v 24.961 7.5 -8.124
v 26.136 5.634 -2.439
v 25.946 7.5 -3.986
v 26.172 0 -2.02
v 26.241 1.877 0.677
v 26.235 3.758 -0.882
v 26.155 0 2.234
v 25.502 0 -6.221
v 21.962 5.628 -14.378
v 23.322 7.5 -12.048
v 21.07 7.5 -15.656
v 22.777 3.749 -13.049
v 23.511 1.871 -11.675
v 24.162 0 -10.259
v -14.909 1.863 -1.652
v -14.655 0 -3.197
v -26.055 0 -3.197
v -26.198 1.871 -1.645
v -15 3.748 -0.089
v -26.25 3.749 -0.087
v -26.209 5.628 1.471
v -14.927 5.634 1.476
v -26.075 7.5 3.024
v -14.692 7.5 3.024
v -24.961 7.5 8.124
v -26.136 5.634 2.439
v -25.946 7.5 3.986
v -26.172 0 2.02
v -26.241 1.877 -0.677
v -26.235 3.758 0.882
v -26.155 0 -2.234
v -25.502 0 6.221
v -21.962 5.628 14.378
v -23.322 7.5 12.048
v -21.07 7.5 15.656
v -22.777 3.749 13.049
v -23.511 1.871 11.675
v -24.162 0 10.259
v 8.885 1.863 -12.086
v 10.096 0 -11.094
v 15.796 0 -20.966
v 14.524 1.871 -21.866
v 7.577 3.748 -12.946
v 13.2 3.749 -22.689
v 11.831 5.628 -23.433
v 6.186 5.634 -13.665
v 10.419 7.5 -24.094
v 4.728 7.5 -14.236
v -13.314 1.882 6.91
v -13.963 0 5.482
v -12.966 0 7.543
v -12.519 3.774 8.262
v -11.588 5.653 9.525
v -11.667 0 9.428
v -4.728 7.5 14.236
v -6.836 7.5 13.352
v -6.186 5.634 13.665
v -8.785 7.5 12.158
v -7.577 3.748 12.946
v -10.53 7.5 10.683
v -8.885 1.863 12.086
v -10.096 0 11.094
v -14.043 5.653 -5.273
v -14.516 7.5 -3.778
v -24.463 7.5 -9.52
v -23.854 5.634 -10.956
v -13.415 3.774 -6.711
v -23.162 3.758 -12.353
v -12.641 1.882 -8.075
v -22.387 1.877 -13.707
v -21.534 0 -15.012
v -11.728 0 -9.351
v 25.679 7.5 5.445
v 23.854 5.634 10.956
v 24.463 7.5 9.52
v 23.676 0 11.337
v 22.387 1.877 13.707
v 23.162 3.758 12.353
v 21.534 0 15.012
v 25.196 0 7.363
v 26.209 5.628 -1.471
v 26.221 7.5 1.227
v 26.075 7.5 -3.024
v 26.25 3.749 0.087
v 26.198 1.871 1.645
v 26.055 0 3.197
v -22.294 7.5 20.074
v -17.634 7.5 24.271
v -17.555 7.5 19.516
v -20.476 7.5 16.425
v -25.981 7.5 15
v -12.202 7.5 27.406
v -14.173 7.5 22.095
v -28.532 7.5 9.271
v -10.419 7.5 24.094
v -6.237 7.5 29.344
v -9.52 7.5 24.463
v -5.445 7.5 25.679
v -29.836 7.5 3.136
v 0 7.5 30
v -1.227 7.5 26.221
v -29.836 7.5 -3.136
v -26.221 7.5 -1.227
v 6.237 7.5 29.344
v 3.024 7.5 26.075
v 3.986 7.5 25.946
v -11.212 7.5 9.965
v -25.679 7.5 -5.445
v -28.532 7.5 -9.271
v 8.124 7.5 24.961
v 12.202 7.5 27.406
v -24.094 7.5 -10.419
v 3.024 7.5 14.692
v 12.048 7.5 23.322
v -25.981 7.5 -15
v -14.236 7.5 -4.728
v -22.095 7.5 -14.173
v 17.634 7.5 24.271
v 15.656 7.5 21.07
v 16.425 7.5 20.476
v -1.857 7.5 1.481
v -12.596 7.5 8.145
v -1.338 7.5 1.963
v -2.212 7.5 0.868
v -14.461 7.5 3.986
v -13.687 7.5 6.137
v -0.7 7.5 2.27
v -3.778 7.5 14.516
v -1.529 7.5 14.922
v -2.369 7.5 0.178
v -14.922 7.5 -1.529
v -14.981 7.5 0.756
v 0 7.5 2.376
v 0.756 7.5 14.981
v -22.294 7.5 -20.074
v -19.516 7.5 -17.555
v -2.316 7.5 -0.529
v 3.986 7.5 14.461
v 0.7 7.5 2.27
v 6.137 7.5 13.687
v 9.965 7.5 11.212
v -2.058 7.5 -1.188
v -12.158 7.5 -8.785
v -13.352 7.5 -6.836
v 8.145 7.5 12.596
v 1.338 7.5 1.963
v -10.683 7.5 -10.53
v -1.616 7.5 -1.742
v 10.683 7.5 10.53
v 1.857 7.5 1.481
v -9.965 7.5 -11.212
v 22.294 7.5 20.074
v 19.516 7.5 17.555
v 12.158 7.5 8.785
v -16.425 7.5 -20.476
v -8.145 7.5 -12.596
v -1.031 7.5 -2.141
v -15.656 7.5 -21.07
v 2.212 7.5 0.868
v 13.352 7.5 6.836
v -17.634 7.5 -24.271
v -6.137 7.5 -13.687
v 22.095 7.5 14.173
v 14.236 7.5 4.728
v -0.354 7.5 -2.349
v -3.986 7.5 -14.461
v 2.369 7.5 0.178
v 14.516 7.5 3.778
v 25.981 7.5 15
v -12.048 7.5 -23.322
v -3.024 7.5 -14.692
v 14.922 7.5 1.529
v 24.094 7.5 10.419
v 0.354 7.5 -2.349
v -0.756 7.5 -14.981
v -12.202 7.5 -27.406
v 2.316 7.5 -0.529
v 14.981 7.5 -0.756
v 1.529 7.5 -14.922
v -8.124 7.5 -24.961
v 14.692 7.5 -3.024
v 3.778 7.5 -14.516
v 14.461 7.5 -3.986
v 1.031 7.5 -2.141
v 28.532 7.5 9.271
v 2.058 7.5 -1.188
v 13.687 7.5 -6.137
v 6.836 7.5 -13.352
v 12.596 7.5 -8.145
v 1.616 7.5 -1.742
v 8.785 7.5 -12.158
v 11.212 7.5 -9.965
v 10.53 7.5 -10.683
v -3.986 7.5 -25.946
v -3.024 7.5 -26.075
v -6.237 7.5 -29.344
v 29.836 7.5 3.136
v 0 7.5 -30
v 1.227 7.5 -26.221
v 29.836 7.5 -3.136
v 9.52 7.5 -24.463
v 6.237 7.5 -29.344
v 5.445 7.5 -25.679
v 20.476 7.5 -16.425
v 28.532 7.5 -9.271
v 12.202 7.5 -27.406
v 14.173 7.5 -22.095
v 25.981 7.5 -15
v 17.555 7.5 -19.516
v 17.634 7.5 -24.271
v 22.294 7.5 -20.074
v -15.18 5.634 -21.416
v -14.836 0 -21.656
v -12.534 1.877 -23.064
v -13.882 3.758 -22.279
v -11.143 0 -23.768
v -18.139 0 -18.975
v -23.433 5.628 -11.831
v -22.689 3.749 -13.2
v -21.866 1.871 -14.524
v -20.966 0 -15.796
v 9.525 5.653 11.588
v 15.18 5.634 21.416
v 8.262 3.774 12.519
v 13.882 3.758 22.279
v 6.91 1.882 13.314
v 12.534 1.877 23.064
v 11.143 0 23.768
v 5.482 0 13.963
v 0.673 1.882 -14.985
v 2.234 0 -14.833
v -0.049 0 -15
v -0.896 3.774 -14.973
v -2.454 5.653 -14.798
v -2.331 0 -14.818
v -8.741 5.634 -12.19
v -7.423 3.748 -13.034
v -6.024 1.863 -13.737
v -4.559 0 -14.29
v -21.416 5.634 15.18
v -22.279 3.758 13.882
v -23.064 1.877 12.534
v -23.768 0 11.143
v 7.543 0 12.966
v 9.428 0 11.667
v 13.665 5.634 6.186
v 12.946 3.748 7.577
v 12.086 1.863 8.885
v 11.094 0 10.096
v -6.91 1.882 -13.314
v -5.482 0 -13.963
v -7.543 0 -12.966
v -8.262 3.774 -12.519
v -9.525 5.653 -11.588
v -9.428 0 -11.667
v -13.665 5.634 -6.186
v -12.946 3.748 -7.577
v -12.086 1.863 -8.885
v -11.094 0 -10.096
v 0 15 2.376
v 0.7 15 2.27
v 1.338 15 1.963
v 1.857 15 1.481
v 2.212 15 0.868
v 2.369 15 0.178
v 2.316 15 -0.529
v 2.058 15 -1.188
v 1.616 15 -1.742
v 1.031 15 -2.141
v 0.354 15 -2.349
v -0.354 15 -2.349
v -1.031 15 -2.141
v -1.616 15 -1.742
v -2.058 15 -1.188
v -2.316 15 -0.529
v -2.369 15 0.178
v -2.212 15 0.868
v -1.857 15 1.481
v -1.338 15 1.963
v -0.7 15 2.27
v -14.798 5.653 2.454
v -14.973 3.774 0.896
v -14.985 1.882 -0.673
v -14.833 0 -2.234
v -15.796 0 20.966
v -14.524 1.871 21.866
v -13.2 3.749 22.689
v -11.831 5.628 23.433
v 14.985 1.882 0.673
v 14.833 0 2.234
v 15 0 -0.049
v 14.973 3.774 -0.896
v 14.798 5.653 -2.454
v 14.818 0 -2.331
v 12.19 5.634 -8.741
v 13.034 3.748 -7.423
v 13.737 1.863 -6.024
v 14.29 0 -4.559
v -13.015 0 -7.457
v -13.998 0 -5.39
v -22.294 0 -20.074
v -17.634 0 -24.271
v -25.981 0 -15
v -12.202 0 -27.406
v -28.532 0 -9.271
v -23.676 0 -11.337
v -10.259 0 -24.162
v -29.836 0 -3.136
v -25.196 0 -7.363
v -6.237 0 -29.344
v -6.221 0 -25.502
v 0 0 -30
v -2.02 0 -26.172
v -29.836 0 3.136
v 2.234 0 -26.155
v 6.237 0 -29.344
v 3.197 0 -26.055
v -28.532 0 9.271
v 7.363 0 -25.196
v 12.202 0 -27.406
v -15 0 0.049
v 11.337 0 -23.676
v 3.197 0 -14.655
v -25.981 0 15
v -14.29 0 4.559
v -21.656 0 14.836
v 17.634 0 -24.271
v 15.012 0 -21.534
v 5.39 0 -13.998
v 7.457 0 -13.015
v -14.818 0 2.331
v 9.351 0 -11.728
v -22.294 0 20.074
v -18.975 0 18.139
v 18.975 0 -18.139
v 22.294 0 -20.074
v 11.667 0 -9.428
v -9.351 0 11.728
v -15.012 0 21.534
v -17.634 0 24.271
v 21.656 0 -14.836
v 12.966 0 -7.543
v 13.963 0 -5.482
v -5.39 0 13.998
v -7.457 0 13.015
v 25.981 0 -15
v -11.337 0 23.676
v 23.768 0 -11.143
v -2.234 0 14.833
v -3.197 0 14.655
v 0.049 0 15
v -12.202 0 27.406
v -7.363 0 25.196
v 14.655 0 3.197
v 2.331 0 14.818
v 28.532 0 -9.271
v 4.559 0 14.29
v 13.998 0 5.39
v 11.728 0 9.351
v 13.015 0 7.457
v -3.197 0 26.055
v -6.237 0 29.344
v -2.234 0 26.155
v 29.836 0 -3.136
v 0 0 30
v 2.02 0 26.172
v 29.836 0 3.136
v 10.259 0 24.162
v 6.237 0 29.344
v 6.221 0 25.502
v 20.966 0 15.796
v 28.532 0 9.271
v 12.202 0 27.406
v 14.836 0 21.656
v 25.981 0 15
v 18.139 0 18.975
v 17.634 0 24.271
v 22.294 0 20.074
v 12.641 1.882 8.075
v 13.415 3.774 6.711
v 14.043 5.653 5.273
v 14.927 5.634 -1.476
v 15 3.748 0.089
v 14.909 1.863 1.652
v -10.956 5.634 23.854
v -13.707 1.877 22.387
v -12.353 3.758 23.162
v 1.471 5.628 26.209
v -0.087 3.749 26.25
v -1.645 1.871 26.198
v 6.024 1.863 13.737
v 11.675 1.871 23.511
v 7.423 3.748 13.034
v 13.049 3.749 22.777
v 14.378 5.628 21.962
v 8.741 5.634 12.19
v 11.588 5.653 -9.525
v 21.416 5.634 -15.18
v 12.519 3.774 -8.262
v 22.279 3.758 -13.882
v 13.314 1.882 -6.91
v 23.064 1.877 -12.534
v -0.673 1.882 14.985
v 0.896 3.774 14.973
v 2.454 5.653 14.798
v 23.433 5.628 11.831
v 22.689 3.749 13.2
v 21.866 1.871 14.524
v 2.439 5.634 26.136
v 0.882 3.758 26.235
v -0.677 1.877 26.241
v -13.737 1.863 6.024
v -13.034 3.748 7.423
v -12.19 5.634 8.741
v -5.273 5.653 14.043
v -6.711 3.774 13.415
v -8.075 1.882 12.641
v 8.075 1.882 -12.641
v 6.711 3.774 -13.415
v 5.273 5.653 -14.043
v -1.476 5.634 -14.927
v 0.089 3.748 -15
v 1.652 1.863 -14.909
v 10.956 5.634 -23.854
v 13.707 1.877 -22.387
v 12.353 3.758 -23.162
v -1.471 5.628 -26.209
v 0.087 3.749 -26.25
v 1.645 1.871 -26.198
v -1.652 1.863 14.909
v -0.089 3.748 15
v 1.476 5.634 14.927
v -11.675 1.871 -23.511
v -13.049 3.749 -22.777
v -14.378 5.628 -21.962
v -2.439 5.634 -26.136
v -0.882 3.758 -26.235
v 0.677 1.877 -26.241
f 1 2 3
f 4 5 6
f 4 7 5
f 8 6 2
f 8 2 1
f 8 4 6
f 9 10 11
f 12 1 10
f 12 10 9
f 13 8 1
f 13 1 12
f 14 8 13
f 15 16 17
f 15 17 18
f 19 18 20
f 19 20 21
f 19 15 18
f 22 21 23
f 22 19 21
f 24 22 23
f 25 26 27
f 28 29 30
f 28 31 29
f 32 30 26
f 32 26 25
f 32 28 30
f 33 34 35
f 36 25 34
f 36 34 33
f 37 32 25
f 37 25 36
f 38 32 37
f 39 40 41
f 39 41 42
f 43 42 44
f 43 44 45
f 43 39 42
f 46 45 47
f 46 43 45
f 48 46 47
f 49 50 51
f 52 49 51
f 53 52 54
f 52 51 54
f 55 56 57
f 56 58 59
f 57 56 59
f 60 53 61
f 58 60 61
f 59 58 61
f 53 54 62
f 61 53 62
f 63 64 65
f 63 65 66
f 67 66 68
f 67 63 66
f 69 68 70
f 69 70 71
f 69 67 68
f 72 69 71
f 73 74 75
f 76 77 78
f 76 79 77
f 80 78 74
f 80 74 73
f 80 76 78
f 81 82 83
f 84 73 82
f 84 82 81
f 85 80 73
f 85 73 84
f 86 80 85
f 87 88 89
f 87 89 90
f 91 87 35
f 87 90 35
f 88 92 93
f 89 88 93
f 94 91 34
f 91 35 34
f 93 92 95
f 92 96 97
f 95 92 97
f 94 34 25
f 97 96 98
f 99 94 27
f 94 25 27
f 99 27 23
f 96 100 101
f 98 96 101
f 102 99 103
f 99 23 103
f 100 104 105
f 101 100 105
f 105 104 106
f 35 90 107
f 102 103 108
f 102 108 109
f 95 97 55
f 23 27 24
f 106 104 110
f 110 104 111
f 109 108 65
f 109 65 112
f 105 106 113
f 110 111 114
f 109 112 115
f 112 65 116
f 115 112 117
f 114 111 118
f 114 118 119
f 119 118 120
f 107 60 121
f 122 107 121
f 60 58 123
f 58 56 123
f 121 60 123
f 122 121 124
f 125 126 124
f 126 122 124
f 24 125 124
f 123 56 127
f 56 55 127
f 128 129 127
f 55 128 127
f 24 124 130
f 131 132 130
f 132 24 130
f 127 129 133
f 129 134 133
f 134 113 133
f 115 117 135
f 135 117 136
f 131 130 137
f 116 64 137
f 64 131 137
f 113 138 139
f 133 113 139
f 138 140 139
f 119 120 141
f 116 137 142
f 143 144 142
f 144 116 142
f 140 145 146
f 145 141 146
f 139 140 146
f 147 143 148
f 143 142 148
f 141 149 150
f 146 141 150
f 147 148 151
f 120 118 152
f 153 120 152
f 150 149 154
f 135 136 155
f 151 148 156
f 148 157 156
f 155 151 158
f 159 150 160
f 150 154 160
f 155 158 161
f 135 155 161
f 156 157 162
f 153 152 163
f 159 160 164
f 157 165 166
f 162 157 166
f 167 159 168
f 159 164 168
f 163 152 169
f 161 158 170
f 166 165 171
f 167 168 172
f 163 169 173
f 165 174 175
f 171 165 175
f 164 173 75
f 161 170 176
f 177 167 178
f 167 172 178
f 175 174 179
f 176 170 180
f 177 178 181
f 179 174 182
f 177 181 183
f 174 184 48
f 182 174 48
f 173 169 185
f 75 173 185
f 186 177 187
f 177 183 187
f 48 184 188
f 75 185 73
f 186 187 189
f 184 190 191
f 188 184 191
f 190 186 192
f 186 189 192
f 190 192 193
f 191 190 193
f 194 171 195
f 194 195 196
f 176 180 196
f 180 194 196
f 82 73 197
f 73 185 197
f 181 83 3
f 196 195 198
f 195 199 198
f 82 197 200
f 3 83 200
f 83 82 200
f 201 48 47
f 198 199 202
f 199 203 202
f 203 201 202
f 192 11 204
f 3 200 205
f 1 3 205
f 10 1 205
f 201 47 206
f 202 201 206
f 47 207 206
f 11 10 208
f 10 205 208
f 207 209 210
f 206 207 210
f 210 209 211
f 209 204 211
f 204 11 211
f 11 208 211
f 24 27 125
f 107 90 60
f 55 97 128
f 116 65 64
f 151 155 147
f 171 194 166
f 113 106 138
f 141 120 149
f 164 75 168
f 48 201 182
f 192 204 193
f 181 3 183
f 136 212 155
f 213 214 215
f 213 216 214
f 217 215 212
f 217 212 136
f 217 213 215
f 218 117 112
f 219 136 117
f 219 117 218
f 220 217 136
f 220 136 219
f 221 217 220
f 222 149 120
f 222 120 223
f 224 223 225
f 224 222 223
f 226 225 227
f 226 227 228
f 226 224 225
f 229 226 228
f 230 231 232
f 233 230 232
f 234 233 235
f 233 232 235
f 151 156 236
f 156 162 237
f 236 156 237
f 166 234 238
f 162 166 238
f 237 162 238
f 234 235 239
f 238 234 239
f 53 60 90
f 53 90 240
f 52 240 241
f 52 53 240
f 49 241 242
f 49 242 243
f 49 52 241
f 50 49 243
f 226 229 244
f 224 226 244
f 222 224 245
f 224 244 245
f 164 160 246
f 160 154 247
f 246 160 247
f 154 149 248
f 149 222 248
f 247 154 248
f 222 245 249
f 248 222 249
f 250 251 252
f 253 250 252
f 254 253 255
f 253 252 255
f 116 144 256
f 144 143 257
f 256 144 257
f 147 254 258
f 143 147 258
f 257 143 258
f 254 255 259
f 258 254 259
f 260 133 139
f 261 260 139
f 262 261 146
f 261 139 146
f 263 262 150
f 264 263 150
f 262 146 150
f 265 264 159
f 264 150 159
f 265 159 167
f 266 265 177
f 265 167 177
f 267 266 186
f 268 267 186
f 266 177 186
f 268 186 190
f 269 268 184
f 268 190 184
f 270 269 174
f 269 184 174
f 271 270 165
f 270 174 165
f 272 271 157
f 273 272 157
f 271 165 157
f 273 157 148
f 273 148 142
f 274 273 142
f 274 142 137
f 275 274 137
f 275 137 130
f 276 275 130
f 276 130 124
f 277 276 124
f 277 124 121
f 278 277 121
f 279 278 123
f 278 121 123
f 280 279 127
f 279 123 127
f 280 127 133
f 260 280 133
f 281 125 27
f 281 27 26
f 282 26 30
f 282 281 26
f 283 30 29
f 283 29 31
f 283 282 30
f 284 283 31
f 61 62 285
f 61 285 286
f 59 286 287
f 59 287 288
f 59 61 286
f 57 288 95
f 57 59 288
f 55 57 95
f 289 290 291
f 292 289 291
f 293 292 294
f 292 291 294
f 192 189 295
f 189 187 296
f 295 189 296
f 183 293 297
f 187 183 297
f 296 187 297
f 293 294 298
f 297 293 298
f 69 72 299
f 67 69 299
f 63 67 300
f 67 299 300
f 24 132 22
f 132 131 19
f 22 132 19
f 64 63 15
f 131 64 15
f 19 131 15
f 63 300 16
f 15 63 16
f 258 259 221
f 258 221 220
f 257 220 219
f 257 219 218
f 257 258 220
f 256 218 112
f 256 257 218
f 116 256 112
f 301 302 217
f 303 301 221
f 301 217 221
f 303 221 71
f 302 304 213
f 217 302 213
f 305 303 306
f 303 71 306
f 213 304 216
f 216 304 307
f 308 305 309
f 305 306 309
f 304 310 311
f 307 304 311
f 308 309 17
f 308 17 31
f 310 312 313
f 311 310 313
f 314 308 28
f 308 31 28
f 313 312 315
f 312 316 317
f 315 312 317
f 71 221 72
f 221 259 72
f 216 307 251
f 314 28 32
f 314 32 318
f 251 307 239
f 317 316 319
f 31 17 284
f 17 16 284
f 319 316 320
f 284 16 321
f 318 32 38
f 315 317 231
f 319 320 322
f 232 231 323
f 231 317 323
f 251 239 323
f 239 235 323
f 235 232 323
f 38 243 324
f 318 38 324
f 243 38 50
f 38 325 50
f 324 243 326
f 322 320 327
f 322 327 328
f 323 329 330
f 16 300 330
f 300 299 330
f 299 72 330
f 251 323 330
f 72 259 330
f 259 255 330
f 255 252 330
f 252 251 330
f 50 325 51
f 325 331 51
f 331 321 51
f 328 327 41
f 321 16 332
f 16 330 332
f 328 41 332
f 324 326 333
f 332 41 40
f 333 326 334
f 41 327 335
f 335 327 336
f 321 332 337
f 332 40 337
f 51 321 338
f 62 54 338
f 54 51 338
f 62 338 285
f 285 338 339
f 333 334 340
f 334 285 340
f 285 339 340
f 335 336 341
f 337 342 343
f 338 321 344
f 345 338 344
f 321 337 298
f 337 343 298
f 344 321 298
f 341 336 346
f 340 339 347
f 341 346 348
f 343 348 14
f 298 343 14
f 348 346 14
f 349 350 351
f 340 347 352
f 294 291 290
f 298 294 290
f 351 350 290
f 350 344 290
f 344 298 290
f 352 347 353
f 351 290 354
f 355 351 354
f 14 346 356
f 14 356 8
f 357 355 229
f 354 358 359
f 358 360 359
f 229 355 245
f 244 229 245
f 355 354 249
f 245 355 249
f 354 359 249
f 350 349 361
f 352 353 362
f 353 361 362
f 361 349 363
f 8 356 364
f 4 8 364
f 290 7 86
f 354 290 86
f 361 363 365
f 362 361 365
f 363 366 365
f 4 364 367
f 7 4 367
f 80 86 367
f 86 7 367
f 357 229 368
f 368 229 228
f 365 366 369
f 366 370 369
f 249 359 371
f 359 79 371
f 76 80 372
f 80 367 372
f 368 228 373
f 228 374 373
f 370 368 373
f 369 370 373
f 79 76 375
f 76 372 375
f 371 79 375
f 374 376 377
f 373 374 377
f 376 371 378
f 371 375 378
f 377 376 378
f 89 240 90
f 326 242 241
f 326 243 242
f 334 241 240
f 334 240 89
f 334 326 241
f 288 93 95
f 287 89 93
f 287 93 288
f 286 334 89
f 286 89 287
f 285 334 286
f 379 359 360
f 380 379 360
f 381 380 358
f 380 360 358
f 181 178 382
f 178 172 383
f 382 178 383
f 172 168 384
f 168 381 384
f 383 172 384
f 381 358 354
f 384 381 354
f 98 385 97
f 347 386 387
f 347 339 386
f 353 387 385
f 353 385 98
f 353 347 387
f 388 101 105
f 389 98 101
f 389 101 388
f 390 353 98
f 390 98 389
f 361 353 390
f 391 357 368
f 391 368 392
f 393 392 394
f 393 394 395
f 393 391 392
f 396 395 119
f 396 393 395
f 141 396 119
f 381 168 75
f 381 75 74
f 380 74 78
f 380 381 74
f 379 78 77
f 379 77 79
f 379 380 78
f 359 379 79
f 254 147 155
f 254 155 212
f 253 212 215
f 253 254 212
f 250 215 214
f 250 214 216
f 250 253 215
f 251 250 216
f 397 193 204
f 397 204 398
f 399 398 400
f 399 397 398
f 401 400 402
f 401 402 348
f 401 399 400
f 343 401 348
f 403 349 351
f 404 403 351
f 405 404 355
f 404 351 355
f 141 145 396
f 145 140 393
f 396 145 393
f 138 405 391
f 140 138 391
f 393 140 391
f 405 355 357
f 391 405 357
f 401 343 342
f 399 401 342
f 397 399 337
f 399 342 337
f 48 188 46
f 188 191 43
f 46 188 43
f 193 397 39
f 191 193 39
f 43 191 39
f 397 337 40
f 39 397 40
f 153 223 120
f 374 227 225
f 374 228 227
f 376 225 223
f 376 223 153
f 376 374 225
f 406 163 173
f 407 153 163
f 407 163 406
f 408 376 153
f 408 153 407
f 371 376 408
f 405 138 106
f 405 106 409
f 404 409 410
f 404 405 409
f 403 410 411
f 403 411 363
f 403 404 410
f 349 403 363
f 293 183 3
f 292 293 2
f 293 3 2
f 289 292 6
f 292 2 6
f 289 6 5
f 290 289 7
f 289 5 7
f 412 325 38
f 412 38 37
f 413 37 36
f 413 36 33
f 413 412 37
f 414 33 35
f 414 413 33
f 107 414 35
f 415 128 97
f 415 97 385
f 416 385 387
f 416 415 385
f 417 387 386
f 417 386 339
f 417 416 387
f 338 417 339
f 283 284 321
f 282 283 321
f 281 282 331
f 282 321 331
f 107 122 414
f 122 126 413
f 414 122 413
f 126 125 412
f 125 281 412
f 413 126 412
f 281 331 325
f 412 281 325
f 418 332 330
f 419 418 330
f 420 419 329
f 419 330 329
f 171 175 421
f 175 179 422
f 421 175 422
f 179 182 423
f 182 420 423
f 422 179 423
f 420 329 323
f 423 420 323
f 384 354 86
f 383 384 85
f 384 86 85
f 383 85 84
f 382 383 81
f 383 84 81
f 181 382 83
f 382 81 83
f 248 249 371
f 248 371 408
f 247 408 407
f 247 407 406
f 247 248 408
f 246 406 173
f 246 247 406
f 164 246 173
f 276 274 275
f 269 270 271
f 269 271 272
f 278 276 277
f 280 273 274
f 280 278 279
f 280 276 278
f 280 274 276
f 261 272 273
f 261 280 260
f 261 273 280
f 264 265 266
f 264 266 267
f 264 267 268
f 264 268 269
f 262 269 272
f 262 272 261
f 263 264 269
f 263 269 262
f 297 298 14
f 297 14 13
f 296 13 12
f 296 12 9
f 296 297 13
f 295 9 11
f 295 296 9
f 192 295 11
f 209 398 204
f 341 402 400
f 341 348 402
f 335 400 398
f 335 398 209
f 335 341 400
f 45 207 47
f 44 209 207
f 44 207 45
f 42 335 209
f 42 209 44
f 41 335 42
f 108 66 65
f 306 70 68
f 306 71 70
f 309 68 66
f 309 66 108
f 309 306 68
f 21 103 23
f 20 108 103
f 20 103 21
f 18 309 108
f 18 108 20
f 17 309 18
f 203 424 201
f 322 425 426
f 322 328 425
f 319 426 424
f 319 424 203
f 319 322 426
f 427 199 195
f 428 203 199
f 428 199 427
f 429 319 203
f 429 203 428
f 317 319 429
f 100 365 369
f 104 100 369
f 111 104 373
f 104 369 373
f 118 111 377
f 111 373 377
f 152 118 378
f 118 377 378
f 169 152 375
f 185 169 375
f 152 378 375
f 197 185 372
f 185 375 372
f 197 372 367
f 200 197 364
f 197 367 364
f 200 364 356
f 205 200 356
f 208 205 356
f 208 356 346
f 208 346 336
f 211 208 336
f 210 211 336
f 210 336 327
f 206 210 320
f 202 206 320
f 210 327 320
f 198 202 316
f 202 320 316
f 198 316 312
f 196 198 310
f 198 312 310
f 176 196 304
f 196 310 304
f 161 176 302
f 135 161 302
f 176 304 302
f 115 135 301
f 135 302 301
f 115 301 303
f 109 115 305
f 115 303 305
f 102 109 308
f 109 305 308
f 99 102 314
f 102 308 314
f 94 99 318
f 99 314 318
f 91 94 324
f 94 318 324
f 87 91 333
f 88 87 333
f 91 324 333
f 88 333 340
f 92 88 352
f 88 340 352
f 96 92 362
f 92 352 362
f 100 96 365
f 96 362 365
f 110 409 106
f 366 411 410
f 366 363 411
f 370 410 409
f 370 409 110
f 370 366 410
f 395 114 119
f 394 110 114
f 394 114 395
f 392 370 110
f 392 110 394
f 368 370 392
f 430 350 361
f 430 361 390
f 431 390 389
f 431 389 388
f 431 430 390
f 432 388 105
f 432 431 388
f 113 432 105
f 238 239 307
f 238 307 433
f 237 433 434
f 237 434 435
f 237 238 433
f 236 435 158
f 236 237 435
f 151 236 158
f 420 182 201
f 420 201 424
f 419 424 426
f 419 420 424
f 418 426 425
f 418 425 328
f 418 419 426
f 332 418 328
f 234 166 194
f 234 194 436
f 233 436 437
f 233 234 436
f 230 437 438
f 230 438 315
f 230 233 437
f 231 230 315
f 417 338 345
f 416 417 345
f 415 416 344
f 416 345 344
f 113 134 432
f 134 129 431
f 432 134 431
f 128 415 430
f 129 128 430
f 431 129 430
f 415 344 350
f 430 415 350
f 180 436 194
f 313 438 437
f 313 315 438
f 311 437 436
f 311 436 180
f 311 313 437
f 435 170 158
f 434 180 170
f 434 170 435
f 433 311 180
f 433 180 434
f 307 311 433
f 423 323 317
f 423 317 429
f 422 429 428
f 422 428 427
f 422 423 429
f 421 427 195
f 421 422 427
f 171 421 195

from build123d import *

# Parameters (mm, degrees)
SKETCH1_R                            = 20
BOSS_EXTRUDE1_DEPTH                  = 10
SKETCH1_R_2                          = 40
SKETCH1_R_3                          = 35
BOSS_EXTRUDE1_2_DEPTH                = 10
BOSS_EXTRUDE2_REACH                  = 89.446
BOSS_EXTRUDE2_END_RADIUS             = 35
BOSS_EXTRUDE2_START                  = 30
BOSS_EXTRUDE2_DIRECTION_2_REACH      = 89.446
BOSS_EXTRUDE2_DIRECTION_2_END_RADIUS = 20
CIRPATTERN1_COUNT                    = 12
SKETCH5_R                            = 3.167731354
BOSS_EXTRUDE3_DEPTH                  = 10
SCALE1_SCALE                         = 0.75


with BuildPart() as part:
    # Sketch1 → Boss-Extrude1 (new body)
    with BuildSketch(Plane(origin=(0, 0, 0), x_dir=(1, 0, 0), z_dir=(0, 1, 0))):
        with Locations(Location((0, 0, 0), (0, 0, 270))):
            Circle(SKETCH1_R)
    extrude(amount=BOSS_EXTRUDE1_DEPTH)


with BuildPart() as body_2:
    # Sketch1 → Boss-Extrude1 2 (new body)
    with BuildSketch(Plane(origin=(0, 0, 0), x_dir=(1, 0, 0), z_dir=(0, 1, 0))):
        with Locations(Location((0, 0, 0), (0, 0, 270))):
            Circle(SKETCH1_R_2)
        with Locations(Location((0, 0, 0), (0, 0, 270))):
            Circle(SKETCH1_R_3, mode=Mode.SUBTRACT)
    extrude(amount=BOSS_EXTRUDE1_2_DEPTH)


    add(part.part)  # Boss-Extrude2 merges part
    # Boss-Extrude2: up to this cylinder (the profile starts inside it)
    boss_extrude2_end = Plane(origin=(0, 5, 0), z_dir=(0, -1, 0)) * Cylinder(BOSS_EXTRUDE2_END_RADIUS, 249.892, mode=Mode.PRIVATE)
    # Sketch4 → Boss-Extrude2 (add, up to the surface)
    with BuildSketch(Plane(origin=(0, 0, 0), x_dir=(0, 0, -1), z_dir=(1, 0, 0)).offset(BOSS_EXTRUDE2_START), mode=Mode.PRIVATE) as boss_extrude2_sk1:
        Polygon((-4.262410526, 0), (4.031443844, 10), (5.315133993, 10), (-2.978720377, 0), align=None)
    boss_extrude2_tool1 = extrude(boss_extrude2_sk1.sketch, amount=BOSS_EXTRUDE2_REACH, mode=Mode.PRIVATE) & boss_extrude2_end
    boss_extrude2 = boss_extrude2_tool1.solids().sort_by_distance((30, 5, -0.526362))[0]
    add(boss_extrude2)

    # Boss-Extrude2 direction 2: up to this cylinder (the profile starts outside it)
    boss_extrude2_direction_2_end = Plane(origin=(0, 5, 0), z_dir=(0, -1, 0)) * Cylinder(BOSS_EXTRUDE2_DIRECTION_2_END_RADIUS, 219.892, mode=Mode.PRIVATE)
    # Sketch4 → Boss-Extrude2 direction 2 (add, up to the surface)
    with BuildSketch(Plane(origin=(0, 0, 0), x_dir=(0, 0, -1), z_dir=(1, 0, 0)).offset(BOSS_EXTRUDE2_START), mode=Mode.PRIVATE) as boss_extrude2_direction_2_sk1:
        Polygon((-4.262410526, 0), (4.031443844, 10), (5.315133993, 10), (-2.978720377, 0), align=None)
    boss_extrude2_direction_2_tool1 = extrude(boss_extrude2_direction_2_sk1.sketch, amount=-BOSS_EXTRUDE2_DIRECTION_2_REACH, mode=Mode.PRIVATE) - boss_extrude2_direction_2_end
    boss_extrude2_direction_2 = boss_extrude2_direction_2_tool1.solids().sort_by_distance((30, 5, -0.526362))[0]
    add(boss_extrude2_direction_2)
    boss_extrude2 = boss_extrude2 + boss_extrude2_direction_2  # both directions under the feature's name, for the pattern or mirror that repeats it

    # CirPattern1: Boss-Extrude2 ×12 about axis
    cirpattern1_axis = Axis((0, 0, 0), (0, 1, 0))
    for i in range(1, CIRPATTERN1_COUNT):
        add(boss_extrude2.rotate(cirpattern1_axis, i * 360 / CIRPATTERN1_COUNT))

    # Sketch5 → Boss-Extrude3 (add)
    with BuildSketch(Plane(origin=(0, 10, 0), x_dir=(1, 0, 0), z_dir=(0, 1, 0))):
        with Locations(Location((0, 0, 0), (0, 0, 270))):
            Circle(SKETCH5_R)
    extrude(amount=BOSS_EXTRUDE3_DEPTH)


with BuildPart() as body_2_1:
    # Scale1: scaled about (0, 0, 0)
    add(body_2.part.scale(SCALE1_SCALE))


solid = body_2_1.part
